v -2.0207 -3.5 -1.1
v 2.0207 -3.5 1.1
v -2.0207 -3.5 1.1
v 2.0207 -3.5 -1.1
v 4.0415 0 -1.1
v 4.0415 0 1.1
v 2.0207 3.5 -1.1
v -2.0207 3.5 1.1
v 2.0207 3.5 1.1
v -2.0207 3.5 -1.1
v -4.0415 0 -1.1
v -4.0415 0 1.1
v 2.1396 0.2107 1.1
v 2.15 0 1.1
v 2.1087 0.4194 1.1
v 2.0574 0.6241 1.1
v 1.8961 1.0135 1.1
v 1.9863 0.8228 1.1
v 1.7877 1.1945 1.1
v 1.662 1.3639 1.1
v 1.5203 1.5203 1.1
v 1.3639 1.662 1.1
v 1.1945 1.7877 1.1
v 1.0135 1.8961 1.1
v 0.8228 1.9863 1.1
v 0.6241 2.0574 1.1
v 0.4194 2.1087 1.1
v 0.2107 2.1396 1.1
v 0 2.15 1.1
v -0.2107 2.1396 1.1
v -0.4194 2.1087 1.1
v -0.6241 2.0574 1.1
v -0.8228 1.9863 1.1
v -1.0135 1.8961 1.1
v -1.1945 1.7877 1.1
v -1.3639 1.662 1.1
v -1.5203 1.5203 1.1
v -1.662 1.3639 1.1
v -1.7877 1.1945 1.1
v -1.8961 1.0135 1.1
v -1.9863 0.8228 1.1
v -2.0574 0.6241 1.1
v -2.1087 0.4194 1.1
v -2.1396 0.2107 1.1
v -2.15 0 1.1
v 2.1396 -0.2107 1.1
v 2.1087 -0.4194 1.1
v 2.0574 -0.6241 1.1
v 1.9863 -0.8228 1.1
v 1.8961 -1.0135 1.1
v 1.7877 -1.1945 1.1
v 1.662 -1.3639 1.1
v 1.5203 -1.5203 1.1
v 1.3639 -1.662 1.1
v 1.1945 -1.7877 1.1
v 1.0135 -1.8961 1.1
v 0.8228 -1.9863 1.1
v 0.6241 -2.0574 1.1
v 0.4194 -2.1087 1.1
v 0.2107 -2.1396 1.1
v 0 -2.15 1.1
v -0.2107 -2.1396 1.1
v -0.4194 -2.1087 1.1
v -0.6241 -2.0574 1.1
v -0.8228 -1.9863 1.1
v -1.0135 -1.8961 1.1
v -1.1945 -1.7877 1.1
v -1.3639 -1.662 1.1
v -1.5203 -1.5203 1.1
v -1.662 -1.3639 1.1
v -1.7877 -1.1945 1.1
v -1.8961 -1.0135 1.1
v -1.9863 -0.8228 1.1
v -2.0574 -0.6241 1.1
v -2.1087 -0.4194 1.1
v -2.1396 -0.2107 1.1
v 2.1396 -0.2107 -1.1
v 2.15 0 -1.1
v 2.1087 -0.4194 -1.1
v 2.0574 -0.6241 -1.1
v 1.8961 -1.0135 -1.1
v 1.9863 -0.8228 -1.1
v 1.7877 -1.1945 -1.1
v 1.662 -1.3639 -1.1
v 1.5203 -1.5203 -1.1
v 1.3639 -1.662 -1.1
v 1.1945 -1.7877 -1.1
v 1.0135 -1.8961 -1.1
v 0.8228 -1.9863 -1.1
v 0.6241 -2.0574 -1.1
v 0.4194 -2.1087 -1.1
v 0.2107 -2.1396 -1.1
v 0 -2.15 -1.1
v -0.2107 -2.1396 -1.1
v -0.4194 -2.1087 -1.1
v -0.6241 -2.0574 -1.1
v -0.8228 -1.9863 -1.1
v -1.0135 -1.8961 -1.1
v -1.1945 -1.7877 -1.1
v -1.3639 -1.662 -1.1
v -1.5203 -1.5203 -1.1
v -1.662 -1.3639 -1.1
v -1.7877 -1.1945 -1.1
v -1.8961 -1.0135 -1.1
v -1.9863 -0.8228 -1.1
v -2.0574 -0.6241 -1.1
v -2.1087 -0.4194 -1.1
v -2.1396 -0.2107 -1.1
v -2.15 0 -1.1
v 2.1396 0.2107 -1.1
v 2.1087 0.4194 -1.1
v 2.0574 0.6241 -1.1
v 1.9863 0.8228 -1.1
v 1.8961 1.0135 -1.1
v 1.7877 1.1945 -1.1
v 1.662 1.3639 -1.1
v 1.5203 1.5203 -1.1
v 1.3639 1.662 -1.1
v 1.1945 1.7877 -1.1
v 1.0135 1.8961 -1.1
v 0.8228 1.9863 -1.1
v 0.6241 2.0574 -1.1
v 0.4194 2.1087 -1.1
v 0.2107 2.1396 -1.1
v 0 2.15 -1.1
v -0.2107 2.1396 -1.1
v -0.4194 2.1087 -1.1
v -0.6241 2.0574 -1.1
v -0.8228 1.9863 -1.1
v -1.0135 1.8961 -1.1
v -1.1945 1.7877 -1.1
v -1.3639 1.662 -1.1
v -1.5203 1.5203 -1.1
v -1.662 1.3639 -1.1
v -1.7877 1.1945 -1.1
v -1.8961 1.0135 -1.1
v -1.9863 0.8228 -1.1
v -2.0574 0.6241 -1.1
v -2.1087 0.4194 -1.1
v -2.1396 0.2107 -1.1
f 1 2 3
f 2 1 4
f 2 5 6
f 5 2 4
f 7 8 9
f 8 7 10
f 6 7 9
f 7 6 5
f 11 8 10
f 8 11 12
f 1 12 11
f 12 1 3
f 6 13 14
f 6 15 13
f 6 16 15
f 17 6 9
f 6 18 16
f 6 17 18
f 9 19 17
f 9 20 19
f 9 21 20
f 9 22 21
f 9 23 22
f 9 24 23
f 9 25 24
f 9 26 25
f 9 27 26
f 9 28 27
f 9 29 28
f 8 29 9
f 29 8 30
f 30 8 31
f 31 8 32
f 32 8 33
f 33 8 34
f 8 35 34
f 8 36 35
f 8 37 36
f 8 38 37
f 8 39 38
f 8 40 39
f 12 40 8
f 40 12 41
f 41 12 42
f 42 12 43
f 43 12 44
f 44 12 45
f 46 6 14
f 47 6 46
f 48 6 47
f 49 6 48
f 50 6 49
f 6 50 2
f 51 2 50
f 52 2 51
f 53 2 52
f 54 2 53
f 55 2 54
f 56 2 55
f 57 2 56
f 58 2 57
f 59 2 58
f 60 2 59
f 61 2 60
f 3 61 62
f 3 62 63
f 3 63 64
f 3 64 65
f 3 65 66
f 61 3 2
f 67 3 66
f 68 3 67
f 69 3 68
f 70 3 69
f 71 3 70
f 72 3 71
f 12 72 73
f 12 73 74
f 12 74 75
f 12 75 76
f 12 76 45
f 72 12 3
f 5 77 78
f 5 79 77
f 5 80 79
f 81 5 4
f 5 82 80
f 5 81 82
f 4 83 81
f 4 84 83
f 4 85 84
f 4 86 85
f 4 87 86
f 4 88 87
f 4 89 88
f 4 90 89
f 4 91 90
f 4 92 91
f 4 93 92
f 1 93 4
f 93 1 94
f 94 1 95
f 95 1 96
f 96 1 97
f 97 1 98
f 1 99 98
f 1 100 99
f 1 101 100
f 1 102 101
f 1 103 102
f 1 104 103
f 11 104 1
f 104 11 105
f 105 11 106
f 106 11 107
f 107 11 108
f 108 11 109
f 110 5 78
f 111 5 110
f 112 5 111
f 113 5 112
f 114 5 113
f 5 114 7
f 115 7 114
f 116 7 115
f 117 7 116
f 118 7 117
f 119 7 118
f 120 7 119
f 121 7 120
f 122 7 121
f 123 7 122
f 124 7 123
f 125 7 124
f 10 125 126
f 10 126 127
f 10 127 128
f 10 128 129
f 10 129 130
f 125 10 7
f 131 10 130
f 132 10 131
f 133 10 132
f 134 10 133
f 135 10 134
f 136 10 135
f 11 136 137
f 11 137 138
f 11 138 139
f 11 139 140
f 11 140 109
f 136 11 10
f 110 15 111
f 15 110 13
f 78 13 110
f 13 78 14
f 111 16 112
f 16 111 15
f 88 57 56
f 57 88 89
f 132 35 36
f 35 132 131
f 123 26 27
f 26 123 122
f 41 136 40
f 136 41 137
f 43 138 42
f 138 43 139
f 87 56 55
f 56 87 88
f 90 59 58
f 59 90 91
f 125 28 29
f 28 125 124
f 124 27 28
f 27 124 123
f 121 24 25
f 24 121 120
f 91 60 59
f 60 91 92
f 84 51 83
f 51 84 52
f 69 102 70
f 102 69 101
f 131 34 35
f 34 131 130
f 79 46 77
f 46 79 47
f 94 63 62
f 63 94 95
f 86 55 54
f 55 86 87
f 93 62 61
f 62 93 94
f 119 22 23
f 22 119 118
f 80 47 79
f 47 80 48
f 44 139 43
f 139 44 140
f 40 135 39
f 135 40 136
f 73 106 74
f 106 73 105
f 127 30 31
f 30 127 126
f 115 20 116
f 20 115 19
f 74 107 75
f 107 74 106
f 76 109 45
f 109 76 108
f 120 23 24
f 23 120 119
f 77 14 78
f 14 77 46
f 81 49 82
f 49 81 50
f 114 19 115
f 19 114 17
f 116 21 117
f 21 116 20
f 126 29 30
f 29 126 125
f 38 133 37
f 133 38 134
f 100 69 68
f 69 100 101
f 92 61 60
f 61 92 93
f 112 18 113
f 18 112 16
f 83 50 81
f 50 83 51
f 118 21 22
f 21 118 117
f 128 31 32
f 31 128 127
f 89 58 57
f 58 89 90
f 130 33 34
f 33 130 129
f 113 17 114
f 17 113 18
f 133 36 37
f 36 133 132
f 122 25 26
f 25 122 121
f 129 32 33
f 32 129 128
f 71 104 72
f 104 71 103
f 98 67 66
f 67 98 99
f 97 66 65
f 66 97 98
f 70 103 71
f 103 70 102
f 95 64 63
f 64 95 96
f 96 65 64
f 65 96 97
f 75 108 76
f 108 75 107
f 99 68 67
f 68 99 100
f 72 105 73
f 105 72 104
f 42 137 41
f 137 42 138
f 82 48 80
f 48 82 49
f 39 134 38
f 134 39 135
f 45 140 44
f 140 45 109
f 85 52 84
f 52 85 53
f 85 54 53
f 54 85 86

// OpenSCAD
$fn=64;

module hex_nut(af=7.0, thickness=2.2, hole_d=4.0, clearance=0.3){
    r = af / sqrt(3); // circumradius for across-flats dimension
    difference(){
        cylinder(h=thickness, r=r, center=true, $fn=6);
        cylinder(h=thickness+0.4, d=hole_d+clearance, center=true, $fn=64);
    }
}

hex_nut();
